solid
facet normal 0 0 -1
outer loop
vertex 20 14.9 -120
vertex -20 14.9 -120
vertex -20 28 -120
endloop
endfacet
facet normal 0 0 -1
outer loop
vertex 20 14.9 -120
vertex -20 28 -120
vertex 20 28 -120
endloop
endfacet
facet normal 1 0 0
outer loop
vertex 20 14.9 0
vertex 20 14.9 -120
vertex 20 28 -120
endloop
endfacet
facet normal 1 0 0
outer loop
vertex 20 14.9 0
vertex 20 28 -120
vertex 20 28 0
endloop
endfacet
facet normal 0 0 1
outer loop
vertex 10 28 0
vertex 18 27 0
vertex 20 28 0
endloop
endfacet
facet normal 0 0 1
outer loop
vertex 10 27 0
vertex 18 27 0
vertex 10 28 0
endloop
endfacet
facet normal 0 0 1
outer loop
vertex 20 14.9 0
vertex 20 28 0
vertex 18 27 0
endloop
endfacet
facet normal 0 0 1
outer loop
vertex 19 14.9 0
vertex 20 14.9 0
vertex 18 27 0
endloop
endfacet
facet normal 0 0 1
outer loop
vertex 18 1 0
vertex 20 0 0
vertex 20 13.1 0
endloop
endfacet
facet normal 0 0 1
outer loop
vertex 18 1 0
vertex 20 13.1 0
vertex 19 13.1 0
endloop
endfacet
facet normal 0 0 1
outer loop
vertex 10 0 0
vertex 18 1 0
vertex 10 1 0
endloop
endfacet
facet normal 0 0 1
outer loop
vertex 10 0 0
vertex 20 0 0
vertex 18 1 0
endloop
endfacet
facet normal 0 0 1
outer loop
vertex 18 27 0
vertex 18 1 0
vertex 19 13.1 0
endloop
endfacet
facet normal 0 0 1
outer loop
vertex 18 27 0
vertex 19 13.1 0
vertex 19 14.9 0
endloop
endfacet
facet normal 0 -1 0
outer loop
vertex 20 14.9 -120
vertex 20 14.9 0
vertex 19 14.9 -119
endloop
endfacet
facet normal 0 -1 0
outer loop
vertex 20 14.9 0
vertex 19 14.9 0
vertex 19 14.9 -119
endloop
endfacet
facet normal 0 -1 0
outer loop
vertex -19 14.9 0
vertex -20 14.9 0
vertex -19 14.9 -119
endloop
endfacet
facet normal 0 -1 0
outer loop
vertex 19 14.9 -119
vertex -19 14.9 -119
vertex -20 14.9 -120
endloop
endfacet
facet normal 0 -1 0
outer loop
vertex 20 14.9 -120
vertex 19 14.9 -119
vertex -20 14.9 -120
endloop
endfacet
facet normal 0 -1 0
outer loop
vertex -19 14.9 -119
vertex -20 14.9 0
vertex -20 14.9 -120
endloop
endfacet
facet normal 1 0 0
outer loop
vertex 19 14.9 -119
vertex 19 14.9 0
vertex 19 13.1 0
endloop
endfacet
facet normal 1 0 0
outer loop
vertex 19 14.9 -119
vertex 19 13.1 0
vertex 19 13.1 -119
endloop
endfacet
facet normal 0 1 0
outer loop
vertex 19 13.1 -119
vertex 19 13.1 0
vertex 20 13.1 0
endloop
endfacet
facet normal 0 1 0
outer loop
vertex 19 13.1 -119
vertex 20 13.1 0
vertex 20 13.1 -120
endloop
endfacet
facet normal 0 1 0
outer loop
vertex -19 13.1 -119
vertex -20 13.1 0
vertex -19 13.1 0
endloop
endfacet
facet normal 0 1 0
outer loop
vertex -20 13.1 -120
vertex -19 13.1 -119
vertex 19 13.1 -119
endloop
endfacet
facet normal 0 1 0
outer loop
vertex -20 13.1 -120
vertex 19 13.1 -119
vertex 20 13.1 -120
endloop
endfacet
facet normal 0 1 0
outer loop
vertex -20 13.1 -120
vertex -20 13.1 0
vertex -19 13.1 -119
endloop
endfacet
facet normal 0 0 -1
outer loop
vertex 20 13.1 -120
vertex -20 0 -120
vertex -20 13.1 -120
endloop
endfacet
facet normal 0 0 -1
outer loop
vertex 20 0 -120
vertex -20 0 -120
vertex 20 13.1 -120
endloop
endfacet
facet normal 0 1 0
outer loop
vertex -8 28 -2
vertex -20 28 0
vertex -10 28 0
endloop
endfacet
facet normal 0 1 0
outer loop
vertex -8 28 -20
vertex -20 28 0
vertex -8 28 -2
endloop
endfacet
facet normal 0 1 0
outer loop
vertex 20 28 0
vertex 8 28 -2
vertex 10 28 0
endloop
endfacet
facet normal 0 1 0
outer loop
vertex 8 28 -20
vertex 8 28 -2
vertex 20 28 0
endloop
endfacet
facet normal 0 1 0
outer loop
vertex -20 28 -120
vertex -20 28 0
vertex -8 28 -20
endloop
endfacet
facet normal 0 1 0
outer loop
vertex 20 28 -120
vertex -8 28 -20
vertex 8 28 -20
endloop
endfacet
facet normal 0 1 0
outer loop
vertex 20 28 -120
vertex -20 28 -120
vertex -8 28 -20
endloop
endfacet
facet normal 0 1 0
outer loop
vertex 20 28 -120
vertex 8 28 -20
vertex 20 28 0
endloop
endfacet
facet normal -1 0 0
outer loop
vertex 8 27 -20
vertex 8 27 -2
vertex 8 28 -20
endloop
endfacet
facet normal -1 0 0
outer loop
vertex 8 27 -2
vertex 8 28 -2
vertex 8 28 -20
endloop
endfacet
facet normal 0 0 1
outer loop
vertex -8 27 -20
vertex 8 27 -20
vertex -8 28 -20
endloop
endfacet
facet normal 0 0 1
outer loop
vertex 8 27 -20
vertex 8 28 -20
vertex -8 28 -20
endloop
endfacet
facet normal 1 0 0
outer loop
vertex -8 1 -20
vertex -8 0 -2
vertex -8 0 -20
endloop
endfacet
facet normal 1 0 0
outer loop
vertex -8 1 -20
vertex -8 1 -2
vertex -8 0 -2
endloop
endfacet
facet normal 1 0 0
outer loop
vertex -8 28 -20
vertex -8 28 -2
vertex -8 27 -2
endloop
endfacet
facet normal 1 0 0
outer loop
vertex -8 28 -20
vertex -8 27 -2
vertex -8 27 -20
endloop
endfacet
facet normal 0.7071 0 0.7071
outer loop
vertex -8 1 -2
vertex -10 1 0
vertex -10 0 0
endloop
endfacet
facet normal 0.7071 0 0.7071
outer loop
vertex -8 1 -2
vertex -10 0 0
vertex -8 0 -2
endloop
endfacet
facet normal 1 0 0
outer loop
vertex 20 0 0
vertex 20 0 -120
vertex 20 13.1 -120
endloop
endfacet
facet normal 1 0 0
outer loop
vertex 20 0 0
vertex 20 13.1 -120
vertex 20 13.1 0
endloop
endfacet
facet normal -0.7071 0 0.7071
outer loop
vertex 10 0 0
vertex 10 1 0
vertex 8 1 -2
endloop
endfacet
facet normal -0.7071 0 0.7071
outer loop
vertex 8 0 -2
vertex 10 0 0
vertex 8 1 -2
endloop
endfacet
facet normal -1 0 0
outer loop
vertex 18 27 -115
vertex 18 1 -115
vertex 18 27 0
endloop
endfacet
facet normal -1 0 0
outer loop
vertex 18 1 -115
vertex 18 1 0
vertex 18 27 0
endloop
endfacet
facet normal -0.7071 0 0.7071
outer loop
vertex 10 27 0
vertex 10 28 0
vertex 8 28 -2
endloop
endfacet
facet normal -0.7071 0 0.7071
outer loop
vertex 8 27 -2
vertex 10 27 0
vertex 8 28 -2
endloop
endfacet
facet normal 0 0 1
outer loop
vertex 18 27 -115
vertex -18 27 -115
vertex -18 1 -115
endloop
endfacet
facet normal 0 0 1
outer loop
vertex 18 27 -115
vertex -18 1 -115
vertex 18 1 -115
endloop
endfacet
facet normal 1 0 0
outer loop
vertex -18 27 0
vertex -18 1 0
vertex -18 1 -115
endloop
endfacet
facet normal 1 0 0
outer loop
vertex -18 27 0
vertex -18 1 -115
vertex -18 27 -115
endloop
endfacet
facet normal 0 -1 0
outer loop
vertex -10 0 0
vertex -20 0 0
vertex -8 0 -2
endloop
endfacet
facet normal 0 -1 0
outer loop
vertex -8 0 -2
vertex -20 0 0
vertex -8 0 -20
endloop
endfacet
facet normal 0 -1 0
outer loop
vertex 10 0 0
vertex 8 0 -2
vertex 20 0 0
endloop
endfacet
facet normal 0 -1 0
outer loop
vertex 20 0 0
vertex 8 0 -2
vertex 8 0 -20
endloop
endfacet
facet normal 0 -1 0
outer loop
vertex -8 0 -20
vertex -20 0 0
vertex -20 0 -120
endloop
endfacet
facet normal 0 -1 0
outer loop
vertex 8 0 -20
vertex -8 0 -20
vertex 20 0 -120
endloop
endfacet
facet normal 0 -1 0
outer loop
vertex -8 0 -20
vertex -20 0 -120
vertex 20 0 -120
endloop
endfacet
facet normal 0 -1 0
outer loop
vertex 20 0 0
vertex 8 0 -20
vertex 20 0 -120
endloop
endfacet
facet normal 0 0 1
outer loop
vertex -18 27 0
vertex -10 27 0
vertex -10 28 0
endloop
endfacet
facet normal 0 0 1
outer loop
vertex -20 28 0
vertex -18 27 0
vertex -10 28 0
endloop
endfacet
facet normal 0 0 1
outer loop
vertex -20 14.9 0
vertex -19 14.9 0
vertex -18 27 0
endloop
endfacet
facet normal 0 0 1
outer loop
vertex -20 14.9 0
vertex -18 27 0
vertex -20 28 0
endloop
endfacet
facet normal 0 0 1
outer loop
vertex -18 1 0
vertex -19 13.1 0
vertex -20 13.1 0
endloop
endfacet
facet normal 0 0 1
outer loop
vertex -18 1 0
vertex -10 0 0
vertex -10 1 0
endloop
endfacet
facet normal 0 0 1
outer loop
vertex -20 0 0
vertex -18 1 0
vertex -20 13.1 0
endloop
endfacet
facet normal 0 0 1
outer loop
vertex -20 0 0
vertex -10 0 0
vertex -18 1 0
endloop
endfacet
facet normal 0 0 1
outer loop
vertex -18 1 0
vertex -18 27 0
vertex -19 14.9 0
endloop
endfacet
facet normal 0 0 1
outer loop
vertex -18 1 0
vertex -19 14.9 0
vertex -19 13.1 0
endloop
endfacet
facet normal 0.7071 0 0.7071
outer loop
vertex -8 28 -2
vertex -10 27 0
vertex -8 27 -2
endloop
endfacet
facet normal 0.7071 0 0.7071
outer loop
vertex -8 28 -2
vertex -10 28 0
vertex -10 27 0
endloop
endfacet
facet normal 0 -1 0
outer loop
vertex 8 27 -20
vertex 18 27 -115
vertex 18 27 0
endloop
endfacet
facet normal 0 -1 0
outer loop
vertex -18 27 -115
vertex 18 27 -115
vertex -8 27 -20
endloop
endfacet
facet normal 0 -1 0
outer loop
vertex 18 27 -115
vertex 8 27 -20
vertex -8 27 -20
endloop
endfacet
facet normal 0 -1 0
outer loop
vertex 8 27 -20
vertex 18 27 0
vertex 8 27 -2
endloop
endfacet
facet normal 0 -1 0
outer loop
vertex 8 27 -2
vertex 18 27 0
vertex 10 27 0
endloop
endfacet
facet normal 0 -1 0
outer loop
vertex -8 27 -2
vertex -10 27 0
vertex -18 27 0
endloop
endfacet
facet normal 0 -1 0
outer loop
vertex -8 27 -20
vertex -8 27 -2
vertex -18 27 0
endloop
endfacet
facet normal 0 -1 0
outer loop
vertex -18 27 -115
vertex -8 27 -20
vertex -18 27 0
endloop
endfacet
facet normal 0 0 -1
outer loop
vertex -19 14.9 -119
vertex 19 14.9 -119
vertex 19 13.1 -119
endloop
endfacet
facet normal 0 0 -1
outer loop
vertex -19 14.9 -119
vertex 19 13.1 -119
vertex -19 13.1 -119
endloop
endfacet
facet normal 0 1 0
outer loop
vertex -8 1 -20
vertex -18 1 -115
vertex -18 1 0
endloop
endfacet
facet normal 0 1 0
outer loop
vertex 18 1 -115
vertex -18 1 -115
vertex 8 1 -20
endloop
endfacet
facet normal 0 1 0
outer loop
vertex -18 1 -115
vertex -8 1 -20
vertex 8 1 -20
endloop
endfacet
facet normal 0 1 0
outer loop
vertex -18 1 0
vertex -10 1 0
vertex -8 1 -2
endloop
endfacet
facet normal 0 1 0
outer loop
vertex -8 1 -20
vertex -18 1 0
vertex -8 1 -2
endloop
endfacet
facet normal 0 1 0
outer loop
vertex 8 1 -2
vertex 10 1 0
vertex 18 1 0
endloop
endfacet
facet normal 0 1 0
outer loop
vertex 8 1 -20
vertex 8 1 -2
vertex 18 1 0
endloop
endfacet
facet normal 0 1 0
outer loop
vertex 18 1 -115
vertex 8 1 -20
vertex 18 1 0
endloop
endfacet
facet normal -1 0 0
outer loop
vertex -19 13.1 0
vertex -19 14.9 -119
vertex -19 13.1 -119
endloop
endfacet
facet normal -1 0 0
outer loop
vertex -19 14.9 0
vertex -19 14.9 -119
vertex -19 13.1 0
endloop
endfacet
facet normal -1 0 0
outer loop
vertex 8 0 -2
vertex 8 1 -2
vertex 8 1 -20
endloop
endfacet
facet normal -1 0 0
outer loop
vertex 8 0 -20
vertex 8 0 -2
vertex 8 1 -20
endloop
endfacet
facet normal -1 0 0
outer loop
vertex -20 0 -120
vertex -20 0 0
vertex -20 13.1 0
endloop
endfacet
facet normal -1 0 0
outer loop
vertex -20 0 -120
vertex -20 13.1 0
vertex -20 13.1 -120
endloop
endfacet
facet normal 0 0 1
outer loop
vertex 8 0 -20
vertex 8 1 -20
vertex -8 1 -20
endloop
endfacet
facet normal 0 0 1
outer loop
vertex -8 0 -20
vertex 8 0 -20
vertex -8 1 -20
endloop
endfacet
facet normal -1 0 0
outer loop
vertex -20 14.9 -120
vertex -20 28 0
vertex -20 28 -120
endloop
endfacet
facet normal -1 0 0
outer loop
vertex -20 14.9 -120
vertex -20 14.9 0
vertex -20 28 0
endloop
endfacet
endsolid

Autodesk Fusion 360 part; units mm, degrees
sketch "Esboço1" plane through (0, 0, 0) normal (0, 1, 0) x (1, 0, 0)
  line L0 (0, 0) -> (20, 0)
  line L1 (0, 0) -> (-20, 0)
  line L2 (-20, 0) -> (-20, 120)
  line L3 (-20, 120) -> (20, 120)
  line L4 (20, 120) -> (20, 0)
  dimension "d1" = 20
  dimension "d2" = 20
  dimension "d3" = 120
  dimension "d4" = 40
extrude "Extrusão1" add sketch "Esboço1" along normal blind 28
sketch "Esboço2" plane through (0, 0, 0) normal (0, 0, 1) x (1, 0, 0)
  line L0 (-20, 0) -> (20, 0)
  line L1 (20, 0) -> (20, 28)
  line L2 (20, 28) -> (-20, 28)
  line L3 (-20, 28) -> (-20, 0)
  line L4 (0, 0) -> (0, 28) construction
  line L5 (0, 14) -> (0, 27)
  line L6 (0, 27) -> (18, 27)
  line L7 (18, 14) -> (18, 27)
  line L8 (18, 14) -> (18, 1)
  line L9 (18, 1) -> (0, 1)
  line L10 (-18, 1) -> (0, 1)
  line L11 (-18, 14) -> (-18, 1)
  line L12 (-18, 14) -> (-18, 27)
  line L13 (0, 27) -> (-18, 27)
  dimension "d7" = 18
  dimension "d9" = 13
extrude "Extrusão2" cut sketch "Esboço2" against normal blind 115 contours L6 L7 L8 L9 L10 L11 L12 L13
sketch "Esboço3" plane through (0, 28, 0) normal (0, 1, 0) x (-1, 0, 0)
  line L0 (20, 0) -> (-20, 0)
  line L1 (-20, 0) -> (-20, -120)
  line L2 (-20, -120) -> (20, -120)
  line L3 (20, -120) -> (20, 0)
  line L4 (0, 0) -> (10, 0)
  line L5 (0, 0) -> (-10, 0)
  line L6 (-8, -20) -> (8, -20)
  line L7 (-8, -2) -> (-8, -20)
  line L8 (8, -2) -> (8, -20)
  line L9 (10, 0) -> (7.8787, -2.1213)
  line L10 (-10, 0) -> (-7.8787, -2.1213)
  dimension "d13" = 10
  dimension "d14" = 10
  dimension "d19" = 135
  dimension "d20" = 3
  dimension "d22" = 3
extrude "Extrusão3" cut sketch "Esboço3" against normal blind 40 contours L0 L4 L5 L6 L7 L8 L9 L10
sketch "Esboço4" plane through (20, 0, 0) normal (1, 0, 0) x (0, 0, -1)
  line L0 (0, 0) -> (120, 0)
  line L1 (120, 0) -> (120, 28)
  line L2 (120, 28) -> (0, 28)
  line L3 (0, 28) -> (0, 0)
  line L4 (120, 14) -> (120, 14.9)
  line L5 (120, 14) -> (120, 13.1)
  line L6 (120, 13.1) -> (0, 13.1)
  line L7 (120, 14.9) -> (0, 14.9)
  line L8 (0, 14.9) -> (0, 13.1)
  dimension "d25" = 0.9
  dimension "d26" = 0.9
extrude "Extrusão4" cut sketch "Esboço4" against normal blind 1 contours L1 L3 L4 L5 L6 L7 L8
sketch "Esboço5" plane through (-20, 0, 0) normal (-1, 0, 0) x (0, 0, 1)
  line L0 (-120, 0) -> (0, 0)
  line L1 (0, 0) -> (0, 28)
  line L2 (0, 28) -> (-120, 28)
  line L3 (-120, 28) -> (-120, 0)
  line L4 (0, 13.1) -> (0, 14.9)
  line L5 (0, 14.9) -> (-120, 14.9)
  line L6 (0, 13.1) -> (-120, 13.1)
  line L7 (-120, 13.1) -> (-120, 13.3204)
  line L8 (-120, 14.9) -> (-120, 13.1)
  line L9 (-120, 13.1) -> (-120, 14.9)
  dimension "d30" = 1.8
extrude "Extrusão5" cut sketch "Esboço5" against normal blind 1 contours L1 L3 L4 L5 L6 L7 L8 L9
sketch "Esboço6" plane through (0, 0, -120) normal (0, 0, -1) x (-1, 0, 0)
  line L0 (20, 13.1) -> (19, 13.1)
  line L1 (19, 13.1) -> (19, 14.9)
  line L2 (19, 14.9) -> (20, 14.9)
  line L3 (20, 14.9) -> (20, 28)
  line L4 (20, 28) -> (-20, 28)
  line L5 (-20, 28) -> (-20, 14.9)
  line L6 (-20, 14.9) -> (-19, 14.9)
  line L7 (-19, 14.9) -> (-19, 13.1)
  line L8 (-19, 13.1) -> (-20, 13.1)
  line L9 (-20, 13.1) -> (-20, 0)
  line L10 (-20, 0) -> (20, 0)
  line L11 (20, 0) -> (20, 13.1)
  line L12 (-19, 14.9) -> (19, 14.9)
  line L13 (19, 13.1) -> (-19, 13.1)
extrude "Extrusão6" cut sketch "Esboço6" against normal blind 1 contours L1 L7 L12 L13
equation "d9 = ( 26 / 2 ) * 1 mm"
